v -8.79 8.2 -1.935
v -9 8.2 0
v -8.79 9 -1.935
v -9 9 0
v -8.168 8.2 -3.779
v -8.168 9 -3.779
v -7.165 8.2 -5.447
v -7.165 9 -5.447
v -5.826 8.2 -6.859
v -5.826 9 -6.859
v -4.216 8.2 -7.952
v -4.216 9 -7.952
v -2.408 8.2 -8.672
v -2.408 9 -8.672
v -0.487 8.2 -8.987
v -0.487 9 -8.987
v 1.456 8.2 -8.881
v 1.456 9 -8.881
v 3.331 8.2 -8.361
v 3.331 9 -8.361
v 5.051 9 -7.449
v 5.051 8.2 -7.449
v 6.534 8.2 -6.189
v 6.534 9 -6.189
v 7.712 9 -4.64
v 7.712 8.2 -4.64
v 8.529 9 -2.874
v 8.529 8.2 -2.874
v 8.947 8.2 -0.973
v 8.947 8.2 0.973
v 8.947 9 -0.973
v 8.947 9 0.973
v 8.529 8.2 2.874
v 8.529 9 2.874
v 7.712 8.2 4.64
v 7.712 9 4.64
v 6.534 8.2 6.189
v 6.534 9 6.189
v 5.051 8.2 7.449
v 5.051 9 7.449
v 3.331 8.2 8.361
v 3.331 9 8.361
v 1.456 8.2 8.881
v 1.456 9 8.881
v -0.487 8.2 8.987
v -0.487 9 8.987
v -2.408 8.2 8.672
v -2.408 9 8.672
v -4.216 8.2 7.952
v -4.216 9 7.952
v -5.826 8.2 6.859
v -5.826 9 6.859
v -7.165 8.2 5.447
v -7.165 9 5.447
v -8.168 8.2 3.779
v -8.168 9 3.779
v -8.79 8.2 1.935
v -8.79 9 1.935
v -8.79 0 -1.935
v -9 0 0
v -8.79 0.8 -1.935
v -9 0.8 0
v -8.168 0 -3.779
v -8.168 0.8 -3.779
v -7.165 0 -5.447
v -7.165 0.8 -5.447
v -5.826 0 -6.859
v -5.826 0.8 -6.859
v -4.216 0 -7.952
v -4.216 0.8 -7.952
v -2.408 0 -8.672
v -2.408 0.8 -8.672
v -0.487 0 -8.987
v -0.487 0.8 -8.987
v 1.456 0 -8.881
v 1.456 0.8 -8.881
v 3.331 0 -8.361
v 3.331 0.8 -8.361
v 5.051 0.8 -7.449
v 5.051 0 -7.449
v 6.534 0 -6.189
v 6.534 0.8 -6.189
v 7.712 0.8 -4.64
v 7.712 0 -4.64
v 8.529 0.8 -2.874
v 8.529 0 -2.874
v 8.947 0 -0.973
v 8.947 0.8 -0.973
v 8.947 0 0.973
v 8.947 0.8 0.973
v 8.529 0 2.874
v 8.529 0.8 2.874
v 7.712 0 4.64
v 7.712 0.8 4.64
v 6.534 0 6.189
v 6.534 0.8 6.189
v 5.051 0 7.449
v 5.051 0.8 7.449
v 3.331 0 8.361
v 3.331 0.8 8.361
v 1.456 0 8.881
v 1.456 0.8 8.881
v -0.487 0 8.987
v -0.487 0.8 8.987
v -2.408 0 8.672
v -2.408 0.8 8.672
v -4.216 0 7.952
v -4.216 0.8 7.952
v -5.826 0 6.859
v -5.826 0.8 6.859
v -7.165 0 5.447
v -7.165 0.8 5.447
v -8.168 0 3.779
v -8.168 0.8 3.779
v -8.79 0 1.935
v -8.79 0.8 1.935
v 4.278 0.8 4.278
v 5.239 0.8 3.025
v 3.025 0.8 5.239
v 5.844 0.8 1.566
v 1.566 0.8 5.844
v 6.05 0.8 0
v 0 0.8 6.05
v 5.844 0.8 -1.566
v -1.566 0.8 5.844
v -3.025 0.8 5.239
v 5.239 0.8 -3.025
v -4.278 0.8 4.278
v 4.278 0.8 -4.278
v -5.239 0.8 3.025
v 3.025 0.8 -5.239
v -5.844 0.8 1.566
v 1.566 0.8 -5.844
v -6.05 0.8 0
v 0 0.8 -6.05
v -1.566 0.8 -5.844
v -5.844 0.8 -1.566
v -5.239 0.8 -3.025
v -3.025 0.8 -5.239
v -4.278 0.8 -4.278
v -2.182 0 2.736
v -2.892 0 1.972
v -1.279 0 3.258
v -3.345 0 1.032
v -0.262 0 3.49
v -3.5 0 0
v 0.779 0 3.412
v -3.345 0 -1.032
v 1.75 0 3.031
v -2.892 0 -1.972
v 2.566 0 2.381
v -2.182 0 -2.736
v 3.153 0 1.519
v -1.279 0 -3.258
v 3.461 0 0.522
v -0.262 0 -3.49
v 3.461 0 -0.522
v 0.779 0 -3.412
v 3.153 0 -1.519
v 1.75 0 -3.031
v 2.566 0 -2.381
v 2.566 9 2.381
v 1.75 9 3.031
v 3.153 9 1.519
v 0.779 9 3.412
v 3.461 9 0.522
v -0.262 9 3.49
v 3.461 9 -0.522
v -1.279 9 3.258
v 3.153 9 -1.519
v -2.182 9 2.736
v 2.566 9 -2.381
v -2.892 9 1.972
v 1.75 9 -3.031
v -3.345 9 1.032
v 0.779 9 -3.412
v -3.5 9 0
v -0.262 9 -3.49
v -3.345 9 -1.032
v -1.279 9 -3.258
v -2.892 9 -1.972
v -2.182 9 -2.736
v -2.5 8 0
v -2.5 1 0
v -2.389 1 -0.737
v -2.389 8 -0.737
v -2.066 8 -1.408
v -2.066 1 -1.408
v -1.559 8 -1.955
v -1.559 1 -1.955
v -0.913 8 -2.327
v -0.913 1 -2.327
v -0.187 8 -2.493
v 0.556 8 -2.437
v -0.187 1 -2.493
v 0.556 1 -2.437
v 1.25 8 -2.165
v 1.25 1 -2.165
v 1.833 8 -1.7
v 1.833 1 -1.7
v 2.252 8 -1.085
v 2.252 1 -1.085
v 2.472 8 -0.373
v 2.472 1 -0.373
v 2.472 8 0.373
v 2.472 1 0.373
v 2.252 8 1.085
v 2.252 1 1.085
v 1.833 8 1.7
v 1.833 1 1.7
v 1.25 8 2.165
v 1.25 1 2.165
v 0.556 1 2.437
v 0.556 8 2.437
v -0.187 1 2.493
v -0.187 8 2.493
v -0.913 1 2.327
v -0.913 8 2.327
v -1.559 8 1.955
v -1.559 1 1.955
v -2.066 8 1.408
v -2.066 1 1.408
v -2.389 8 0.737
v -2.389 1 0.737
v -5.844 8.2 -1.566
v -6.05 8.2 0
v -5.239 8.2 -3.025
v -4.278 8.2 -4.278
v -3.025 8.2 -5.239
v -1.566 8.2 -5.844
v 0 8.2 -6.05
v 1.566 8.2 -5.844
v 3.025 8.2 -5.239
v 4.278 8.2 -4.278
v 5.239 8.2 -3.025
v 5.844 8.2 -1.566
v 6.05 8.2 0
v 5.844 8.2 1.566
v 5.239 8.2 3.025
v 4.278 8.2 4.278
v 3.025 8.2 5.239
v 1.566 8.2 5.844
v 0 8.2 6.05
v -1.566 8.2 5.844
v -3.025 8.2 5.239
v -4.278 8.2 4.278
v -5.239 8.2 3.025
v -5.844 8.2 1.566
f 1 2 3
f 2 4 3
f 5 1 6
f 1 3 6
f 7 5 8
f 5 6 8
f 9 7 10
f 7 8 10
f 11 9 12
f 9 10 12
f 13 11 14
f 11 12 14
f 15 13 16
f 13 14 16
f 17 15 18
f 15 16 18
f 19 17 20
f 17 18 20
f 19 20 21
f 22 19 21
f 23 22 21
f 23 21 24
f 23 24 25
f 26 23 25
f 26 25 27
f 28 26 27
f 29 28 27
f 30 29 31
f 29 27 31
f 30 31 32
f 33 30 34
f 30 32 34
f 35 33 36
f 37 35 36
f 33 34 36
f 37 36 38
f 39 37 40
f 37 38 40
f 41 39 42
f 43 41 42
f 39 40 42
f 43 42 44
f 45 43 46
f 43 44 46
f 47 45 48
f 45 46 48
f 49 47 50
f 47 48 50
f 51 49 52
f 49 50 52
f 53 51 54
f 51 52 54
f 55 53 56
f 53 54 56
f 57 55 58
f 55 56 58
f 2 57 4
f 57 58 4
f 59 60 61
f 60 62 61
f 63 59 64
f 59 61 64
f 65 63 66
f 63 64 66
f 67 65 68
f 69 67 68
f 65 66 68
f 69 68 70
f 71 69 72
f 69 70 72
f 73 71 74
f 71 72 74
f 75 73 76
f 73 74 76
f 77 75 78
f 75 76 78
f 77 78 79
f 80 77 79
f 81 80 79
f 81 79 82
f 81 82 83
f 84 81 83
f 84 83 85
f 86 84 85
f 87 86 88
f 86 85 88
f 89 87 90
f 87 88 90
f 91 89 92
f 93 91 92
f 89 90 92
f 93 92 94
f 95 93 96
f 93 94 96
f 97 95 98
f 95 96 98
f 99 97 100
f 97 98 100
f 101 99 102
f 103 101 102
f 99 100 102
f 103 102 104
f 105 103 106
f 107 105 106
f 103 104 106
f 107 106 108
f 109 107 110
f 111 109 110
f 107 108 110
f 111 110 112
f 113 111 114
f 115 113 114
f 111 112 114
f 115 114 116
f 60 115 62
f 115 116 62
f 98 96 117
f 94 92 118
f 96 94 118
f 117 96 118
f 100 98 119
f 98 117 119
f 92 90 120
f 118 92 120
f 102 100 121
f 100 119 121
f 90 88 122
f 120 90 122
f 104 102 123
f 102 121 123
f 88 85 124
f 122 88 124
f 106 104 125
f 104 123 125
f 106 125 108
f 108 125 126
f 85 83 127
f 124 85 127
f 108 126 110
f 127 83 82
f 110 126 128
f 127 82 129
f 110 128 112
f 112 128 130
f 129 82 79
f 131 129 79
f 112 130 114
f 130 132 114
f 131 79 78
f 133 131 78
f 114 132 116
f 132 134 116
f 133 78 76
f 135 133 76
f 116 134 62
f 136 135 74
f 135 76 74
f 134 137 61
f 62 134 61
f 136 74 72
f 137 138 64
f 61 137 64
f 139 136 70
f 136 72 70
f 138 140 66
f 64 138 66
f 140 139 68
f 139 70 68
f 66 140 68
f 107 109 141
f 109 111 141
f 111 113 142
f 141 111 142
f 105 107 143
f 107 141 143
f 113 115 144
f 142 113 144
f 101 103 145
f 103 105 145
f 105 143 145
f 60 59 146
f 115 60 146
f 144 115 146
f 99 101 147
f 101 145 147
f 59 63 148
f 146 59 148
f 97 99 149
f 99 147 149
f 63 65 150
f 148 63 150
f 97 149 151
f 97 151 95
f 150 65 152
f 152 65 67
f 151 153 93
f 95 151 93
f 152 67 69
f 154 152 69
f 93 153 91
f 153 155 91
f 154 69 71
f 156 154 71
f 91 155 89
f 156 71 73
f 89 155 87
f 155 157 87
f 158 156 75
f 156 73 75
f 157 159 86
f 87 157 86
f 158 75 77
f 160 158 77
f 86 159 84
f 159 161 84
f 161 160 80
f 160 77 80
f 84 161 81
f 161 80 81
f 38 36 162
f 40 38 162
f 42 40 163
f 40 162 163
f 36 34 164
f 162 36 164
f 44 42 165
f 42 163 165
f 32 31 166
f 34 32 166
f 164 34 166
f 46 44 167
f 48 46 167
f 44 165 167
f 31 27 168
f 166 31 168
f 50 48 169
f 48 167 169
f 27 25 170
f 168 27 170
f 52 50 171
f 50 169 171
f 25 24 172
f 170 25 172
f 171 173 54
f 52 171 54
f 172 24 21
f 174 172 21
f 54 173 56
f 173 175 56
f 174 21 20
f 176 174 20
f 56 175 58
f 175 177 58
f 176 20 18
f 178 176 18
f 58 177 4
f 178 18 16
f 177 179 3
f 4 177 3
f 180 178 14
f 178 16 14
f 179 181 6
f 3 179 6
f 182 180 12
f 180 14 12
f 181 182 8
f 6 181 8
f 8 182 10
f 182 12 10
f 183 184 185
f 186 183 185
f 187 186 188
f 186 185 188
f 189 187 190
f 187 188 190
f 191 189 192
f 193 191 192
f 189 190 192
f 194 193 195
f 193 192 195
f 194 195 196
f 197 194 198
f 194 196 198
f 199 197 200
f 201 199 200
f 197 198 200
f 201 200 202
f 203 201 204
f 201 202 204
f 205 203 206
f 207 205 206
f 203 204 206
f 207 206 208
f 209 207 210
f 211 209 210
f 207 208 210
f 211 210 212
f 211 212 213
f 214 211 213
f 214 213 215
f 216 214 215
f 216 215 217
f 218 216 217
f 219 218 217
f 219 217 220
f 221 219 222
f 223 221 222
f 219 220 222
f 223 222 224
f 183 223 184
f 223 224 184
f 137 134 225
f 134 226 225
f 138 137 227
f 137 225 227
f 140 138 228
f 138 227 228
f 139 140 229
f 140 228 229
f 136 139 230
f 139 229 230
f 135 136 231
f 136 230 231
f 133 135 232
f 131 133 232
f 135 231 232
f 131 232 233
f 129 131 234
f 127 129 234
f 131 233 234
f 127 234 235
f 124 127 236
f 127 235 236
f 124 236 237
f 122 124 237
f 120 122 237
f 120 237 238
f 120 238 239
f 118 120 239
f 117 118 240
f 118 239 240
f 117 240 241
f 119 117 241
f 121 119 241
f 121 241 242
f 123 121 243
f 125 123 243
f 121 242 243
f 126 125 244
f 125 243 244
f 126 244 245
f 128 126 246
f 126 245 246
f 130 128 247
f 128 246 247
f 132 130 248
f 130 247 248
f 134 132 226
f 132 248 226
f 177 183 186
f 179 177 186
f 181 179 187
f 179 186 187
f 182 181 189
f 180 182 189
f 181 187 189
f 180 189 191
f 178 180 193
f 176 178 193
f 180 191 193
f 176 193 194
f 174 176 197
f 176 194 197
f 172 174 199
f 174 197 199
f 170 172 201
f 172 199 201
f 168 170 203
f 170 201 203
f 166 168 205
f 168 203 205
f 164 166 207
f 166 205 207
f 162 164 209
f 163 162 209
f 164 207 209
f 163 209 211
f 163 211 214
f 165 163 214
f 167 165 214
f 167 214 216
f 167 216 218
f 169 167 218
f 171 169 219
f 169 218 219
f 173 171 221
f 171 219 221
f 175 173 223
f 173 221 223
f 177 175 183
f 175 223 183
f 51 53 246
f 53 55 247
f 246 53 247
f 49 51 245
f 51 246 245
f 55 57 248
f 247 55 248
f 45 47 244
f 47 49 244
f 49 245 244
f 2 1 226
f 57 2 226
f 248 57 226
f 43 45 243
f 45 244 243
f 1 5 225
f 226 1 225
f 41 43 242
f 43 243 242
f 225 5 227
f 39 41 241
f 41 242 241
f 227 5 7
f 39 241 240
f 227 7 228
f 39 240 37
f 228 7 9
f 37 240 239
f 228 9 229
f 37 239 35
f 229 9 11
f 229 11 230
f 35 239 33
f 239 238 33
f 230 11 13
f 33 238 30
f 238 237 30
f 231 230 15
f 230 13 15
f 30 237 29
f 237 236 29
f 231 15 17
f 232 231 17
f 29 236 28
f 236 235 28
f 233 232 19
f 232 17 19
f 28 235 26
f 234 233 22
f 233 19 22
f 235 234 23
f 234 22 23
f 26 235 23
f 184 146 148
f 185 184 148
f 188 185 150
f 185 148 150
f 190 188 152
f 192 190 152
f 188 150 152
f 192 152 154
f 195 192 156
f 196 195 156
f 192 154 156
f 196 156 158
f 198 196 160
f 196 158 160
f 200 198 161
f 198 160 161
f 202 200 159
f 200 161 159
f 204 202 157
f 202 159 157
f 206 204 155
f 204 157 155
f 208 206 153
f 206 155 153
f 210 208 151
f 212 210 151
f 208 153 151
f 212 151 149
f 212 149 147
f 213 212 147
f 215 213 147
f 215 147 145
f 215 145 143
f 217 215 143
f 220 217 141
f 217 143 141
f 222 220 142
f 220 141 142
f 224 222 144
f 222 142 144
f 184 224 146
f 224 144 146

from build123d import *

# Parameters (mm, degrees)
CHAMFER_1_SIZE = 1
CHAMFER_2_SIZE = 1


with BuildPart() as part:
    # Эскиз1 → Повернуть1 (revolve)
    with BuildSketch(Plane.XY):
        Polygon((-2.5, 0), (-9, 0), (-9, 0.8), (-6.05, 0.8), (-6.05, 8.2), (-9, 8.2), (-9, 9), (-2.5, 9), align=None)
    revolve(axis=Axis((0, 9, 0), (0, -1, 0)))

    # Фаска1
    chamfer_1_edges = [part.edges().sort_by_distance(p)[0] for p in [
        (2.5, 9, 0),
    ]]
    chamfer(chamfer_1_edges, length=CHAMFER_1_SIZE)

    # Фаска2
    chamfer_2_edges = [part.edges().sort_by_distance(p)[0] for p in [
        (2.5, 0, 0),
    ]]
    chamfer(chamfer_2_edges, length=CHAMFER_2_SIZE)


solid = part.part
